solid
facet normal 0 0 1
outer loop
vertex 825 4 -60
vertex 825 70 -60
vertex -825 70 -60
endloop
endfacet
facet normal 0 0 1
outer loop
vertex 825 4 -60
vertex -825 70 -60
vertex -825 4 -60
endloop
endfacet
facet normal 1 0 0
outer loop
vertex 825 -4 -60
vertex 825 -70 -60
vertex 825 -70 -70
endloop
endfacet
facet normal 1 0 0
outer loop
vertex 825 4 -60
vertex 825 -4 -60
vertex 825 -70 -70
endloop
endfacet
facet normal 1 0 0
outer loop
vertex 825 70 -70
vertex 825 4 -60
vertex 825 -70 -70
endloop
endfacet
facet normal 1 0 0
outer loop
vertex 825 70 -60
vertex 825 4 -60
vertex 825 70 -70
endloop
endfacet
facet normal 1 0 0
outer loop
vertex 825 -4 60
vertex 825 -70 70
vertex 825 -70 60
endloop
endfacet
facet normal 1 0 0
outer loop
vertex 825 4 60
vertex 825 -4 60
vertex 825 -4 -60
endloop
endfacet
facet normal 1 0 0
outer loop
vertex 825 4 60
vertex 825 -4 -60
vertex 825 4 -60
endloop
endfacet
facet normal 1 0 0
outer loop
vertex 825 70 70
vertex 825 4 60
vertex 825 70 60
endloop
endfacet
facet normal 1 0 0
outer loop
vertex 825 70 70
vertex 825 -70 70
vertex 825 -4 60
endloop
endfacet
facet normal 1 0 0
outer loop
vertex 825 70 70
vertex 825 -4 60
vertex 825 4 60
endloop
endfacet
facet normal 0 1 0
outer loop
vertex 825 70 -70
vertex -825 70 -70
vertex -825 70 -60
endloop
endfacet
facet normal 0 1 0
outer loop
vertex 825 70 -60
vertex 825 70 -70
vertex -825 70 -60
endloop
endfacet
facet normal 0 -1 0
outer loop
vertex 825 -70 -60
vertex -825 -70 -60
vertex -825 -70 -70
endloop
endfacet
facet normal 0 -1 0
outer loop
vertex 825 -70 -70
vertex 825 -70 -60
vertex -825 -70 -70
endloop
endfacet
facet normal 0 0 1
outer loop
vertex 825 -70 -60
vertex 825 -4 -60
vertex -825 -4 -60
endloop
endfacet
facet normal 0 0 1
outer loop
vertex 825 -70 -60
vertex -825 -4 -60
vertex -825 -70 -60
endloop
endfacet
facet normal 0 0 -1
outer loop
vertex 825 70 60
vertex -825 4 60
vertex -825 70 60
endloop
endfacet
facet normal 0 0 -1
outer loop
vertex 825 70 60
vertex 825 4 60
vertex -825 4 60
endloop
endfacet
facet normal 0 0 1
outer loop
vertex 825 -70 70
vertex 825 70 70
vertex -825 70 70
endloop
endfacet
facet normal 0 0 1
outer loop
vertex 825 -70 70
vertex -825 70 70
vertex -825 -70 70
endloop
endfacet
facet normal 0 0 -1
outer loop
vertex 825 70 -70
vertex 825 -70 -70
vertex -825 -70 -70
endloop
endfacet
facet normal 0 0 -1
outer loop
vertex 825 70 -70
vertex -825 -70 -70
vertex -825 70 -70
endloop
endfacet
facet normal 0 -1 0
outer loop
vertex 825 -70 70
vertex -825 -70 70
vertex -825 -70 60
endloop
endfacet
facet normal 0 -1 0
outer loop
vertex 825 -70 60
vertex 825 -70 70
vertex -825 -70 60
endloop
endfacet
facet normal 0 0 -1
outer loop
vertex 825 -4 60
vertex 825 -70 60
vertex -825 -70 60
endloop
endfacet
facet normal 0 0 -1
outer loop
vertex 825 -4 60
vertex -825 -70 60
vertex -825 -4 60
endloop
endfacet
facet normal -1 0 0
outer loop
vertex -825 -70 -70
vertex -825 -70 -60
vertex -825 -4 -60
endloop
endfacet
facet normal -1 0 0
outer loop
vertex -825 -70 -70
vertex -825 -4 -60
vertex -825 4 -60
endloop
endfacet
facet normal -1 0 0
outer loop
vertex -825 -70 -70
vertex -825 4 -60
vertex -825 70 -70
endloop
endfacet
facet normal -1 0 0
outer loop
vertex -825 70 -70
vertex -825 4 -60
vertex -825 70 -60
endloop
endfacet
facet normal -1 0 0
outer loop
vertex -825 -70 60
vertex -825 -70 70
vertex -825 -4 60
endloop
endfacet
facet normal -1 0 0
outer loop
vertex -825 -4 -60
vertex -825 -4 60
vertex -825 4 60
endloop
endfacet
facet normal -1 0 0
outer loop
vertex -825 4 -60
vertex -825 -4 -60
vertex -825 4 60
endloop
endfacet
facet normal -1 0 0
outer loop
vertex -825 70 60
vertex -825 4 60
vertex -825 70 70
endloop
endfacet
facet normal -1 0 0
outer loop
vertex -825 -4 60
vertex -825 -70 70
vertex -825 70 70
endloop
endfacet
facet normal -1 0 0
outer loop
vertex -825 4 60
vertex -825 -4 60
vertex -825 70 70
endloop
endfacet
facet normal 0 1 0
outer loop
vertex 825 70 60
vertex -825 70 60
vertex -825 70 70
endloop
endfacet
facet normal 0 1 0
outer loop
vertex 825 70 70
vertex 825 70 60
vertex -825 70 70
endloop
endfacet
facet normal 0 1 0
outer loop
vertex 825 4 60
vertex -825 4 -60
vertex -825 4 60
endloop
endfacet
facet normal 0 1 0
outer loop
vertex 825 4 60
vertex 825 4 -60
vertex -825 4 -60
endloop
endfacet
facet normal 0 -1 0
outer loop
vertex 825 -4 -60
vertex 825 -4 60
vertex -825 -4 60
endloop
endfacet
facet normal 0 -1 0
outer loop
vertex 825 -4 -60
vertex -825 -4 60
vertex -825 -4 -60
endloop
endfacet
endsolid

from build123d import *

# Parameters (mm, degrees)
F1_DEPTH = 825


with BuildPart() as f1:
    # F0 (on Right) → F1 (new body, symmetric)
    with BuildSketch(Plane.YZ):
        Polygon((70, 60), (70, 70), (-70, 70), (-70, 60), (-4, 60), (-4, -60), (-70, -60), (-70, -70), (70, -70), (70, -60), (4, -60), (4, 60), align=None)
    extrude(amount=F1_DEPTH, both=True)


solid = f1.part
